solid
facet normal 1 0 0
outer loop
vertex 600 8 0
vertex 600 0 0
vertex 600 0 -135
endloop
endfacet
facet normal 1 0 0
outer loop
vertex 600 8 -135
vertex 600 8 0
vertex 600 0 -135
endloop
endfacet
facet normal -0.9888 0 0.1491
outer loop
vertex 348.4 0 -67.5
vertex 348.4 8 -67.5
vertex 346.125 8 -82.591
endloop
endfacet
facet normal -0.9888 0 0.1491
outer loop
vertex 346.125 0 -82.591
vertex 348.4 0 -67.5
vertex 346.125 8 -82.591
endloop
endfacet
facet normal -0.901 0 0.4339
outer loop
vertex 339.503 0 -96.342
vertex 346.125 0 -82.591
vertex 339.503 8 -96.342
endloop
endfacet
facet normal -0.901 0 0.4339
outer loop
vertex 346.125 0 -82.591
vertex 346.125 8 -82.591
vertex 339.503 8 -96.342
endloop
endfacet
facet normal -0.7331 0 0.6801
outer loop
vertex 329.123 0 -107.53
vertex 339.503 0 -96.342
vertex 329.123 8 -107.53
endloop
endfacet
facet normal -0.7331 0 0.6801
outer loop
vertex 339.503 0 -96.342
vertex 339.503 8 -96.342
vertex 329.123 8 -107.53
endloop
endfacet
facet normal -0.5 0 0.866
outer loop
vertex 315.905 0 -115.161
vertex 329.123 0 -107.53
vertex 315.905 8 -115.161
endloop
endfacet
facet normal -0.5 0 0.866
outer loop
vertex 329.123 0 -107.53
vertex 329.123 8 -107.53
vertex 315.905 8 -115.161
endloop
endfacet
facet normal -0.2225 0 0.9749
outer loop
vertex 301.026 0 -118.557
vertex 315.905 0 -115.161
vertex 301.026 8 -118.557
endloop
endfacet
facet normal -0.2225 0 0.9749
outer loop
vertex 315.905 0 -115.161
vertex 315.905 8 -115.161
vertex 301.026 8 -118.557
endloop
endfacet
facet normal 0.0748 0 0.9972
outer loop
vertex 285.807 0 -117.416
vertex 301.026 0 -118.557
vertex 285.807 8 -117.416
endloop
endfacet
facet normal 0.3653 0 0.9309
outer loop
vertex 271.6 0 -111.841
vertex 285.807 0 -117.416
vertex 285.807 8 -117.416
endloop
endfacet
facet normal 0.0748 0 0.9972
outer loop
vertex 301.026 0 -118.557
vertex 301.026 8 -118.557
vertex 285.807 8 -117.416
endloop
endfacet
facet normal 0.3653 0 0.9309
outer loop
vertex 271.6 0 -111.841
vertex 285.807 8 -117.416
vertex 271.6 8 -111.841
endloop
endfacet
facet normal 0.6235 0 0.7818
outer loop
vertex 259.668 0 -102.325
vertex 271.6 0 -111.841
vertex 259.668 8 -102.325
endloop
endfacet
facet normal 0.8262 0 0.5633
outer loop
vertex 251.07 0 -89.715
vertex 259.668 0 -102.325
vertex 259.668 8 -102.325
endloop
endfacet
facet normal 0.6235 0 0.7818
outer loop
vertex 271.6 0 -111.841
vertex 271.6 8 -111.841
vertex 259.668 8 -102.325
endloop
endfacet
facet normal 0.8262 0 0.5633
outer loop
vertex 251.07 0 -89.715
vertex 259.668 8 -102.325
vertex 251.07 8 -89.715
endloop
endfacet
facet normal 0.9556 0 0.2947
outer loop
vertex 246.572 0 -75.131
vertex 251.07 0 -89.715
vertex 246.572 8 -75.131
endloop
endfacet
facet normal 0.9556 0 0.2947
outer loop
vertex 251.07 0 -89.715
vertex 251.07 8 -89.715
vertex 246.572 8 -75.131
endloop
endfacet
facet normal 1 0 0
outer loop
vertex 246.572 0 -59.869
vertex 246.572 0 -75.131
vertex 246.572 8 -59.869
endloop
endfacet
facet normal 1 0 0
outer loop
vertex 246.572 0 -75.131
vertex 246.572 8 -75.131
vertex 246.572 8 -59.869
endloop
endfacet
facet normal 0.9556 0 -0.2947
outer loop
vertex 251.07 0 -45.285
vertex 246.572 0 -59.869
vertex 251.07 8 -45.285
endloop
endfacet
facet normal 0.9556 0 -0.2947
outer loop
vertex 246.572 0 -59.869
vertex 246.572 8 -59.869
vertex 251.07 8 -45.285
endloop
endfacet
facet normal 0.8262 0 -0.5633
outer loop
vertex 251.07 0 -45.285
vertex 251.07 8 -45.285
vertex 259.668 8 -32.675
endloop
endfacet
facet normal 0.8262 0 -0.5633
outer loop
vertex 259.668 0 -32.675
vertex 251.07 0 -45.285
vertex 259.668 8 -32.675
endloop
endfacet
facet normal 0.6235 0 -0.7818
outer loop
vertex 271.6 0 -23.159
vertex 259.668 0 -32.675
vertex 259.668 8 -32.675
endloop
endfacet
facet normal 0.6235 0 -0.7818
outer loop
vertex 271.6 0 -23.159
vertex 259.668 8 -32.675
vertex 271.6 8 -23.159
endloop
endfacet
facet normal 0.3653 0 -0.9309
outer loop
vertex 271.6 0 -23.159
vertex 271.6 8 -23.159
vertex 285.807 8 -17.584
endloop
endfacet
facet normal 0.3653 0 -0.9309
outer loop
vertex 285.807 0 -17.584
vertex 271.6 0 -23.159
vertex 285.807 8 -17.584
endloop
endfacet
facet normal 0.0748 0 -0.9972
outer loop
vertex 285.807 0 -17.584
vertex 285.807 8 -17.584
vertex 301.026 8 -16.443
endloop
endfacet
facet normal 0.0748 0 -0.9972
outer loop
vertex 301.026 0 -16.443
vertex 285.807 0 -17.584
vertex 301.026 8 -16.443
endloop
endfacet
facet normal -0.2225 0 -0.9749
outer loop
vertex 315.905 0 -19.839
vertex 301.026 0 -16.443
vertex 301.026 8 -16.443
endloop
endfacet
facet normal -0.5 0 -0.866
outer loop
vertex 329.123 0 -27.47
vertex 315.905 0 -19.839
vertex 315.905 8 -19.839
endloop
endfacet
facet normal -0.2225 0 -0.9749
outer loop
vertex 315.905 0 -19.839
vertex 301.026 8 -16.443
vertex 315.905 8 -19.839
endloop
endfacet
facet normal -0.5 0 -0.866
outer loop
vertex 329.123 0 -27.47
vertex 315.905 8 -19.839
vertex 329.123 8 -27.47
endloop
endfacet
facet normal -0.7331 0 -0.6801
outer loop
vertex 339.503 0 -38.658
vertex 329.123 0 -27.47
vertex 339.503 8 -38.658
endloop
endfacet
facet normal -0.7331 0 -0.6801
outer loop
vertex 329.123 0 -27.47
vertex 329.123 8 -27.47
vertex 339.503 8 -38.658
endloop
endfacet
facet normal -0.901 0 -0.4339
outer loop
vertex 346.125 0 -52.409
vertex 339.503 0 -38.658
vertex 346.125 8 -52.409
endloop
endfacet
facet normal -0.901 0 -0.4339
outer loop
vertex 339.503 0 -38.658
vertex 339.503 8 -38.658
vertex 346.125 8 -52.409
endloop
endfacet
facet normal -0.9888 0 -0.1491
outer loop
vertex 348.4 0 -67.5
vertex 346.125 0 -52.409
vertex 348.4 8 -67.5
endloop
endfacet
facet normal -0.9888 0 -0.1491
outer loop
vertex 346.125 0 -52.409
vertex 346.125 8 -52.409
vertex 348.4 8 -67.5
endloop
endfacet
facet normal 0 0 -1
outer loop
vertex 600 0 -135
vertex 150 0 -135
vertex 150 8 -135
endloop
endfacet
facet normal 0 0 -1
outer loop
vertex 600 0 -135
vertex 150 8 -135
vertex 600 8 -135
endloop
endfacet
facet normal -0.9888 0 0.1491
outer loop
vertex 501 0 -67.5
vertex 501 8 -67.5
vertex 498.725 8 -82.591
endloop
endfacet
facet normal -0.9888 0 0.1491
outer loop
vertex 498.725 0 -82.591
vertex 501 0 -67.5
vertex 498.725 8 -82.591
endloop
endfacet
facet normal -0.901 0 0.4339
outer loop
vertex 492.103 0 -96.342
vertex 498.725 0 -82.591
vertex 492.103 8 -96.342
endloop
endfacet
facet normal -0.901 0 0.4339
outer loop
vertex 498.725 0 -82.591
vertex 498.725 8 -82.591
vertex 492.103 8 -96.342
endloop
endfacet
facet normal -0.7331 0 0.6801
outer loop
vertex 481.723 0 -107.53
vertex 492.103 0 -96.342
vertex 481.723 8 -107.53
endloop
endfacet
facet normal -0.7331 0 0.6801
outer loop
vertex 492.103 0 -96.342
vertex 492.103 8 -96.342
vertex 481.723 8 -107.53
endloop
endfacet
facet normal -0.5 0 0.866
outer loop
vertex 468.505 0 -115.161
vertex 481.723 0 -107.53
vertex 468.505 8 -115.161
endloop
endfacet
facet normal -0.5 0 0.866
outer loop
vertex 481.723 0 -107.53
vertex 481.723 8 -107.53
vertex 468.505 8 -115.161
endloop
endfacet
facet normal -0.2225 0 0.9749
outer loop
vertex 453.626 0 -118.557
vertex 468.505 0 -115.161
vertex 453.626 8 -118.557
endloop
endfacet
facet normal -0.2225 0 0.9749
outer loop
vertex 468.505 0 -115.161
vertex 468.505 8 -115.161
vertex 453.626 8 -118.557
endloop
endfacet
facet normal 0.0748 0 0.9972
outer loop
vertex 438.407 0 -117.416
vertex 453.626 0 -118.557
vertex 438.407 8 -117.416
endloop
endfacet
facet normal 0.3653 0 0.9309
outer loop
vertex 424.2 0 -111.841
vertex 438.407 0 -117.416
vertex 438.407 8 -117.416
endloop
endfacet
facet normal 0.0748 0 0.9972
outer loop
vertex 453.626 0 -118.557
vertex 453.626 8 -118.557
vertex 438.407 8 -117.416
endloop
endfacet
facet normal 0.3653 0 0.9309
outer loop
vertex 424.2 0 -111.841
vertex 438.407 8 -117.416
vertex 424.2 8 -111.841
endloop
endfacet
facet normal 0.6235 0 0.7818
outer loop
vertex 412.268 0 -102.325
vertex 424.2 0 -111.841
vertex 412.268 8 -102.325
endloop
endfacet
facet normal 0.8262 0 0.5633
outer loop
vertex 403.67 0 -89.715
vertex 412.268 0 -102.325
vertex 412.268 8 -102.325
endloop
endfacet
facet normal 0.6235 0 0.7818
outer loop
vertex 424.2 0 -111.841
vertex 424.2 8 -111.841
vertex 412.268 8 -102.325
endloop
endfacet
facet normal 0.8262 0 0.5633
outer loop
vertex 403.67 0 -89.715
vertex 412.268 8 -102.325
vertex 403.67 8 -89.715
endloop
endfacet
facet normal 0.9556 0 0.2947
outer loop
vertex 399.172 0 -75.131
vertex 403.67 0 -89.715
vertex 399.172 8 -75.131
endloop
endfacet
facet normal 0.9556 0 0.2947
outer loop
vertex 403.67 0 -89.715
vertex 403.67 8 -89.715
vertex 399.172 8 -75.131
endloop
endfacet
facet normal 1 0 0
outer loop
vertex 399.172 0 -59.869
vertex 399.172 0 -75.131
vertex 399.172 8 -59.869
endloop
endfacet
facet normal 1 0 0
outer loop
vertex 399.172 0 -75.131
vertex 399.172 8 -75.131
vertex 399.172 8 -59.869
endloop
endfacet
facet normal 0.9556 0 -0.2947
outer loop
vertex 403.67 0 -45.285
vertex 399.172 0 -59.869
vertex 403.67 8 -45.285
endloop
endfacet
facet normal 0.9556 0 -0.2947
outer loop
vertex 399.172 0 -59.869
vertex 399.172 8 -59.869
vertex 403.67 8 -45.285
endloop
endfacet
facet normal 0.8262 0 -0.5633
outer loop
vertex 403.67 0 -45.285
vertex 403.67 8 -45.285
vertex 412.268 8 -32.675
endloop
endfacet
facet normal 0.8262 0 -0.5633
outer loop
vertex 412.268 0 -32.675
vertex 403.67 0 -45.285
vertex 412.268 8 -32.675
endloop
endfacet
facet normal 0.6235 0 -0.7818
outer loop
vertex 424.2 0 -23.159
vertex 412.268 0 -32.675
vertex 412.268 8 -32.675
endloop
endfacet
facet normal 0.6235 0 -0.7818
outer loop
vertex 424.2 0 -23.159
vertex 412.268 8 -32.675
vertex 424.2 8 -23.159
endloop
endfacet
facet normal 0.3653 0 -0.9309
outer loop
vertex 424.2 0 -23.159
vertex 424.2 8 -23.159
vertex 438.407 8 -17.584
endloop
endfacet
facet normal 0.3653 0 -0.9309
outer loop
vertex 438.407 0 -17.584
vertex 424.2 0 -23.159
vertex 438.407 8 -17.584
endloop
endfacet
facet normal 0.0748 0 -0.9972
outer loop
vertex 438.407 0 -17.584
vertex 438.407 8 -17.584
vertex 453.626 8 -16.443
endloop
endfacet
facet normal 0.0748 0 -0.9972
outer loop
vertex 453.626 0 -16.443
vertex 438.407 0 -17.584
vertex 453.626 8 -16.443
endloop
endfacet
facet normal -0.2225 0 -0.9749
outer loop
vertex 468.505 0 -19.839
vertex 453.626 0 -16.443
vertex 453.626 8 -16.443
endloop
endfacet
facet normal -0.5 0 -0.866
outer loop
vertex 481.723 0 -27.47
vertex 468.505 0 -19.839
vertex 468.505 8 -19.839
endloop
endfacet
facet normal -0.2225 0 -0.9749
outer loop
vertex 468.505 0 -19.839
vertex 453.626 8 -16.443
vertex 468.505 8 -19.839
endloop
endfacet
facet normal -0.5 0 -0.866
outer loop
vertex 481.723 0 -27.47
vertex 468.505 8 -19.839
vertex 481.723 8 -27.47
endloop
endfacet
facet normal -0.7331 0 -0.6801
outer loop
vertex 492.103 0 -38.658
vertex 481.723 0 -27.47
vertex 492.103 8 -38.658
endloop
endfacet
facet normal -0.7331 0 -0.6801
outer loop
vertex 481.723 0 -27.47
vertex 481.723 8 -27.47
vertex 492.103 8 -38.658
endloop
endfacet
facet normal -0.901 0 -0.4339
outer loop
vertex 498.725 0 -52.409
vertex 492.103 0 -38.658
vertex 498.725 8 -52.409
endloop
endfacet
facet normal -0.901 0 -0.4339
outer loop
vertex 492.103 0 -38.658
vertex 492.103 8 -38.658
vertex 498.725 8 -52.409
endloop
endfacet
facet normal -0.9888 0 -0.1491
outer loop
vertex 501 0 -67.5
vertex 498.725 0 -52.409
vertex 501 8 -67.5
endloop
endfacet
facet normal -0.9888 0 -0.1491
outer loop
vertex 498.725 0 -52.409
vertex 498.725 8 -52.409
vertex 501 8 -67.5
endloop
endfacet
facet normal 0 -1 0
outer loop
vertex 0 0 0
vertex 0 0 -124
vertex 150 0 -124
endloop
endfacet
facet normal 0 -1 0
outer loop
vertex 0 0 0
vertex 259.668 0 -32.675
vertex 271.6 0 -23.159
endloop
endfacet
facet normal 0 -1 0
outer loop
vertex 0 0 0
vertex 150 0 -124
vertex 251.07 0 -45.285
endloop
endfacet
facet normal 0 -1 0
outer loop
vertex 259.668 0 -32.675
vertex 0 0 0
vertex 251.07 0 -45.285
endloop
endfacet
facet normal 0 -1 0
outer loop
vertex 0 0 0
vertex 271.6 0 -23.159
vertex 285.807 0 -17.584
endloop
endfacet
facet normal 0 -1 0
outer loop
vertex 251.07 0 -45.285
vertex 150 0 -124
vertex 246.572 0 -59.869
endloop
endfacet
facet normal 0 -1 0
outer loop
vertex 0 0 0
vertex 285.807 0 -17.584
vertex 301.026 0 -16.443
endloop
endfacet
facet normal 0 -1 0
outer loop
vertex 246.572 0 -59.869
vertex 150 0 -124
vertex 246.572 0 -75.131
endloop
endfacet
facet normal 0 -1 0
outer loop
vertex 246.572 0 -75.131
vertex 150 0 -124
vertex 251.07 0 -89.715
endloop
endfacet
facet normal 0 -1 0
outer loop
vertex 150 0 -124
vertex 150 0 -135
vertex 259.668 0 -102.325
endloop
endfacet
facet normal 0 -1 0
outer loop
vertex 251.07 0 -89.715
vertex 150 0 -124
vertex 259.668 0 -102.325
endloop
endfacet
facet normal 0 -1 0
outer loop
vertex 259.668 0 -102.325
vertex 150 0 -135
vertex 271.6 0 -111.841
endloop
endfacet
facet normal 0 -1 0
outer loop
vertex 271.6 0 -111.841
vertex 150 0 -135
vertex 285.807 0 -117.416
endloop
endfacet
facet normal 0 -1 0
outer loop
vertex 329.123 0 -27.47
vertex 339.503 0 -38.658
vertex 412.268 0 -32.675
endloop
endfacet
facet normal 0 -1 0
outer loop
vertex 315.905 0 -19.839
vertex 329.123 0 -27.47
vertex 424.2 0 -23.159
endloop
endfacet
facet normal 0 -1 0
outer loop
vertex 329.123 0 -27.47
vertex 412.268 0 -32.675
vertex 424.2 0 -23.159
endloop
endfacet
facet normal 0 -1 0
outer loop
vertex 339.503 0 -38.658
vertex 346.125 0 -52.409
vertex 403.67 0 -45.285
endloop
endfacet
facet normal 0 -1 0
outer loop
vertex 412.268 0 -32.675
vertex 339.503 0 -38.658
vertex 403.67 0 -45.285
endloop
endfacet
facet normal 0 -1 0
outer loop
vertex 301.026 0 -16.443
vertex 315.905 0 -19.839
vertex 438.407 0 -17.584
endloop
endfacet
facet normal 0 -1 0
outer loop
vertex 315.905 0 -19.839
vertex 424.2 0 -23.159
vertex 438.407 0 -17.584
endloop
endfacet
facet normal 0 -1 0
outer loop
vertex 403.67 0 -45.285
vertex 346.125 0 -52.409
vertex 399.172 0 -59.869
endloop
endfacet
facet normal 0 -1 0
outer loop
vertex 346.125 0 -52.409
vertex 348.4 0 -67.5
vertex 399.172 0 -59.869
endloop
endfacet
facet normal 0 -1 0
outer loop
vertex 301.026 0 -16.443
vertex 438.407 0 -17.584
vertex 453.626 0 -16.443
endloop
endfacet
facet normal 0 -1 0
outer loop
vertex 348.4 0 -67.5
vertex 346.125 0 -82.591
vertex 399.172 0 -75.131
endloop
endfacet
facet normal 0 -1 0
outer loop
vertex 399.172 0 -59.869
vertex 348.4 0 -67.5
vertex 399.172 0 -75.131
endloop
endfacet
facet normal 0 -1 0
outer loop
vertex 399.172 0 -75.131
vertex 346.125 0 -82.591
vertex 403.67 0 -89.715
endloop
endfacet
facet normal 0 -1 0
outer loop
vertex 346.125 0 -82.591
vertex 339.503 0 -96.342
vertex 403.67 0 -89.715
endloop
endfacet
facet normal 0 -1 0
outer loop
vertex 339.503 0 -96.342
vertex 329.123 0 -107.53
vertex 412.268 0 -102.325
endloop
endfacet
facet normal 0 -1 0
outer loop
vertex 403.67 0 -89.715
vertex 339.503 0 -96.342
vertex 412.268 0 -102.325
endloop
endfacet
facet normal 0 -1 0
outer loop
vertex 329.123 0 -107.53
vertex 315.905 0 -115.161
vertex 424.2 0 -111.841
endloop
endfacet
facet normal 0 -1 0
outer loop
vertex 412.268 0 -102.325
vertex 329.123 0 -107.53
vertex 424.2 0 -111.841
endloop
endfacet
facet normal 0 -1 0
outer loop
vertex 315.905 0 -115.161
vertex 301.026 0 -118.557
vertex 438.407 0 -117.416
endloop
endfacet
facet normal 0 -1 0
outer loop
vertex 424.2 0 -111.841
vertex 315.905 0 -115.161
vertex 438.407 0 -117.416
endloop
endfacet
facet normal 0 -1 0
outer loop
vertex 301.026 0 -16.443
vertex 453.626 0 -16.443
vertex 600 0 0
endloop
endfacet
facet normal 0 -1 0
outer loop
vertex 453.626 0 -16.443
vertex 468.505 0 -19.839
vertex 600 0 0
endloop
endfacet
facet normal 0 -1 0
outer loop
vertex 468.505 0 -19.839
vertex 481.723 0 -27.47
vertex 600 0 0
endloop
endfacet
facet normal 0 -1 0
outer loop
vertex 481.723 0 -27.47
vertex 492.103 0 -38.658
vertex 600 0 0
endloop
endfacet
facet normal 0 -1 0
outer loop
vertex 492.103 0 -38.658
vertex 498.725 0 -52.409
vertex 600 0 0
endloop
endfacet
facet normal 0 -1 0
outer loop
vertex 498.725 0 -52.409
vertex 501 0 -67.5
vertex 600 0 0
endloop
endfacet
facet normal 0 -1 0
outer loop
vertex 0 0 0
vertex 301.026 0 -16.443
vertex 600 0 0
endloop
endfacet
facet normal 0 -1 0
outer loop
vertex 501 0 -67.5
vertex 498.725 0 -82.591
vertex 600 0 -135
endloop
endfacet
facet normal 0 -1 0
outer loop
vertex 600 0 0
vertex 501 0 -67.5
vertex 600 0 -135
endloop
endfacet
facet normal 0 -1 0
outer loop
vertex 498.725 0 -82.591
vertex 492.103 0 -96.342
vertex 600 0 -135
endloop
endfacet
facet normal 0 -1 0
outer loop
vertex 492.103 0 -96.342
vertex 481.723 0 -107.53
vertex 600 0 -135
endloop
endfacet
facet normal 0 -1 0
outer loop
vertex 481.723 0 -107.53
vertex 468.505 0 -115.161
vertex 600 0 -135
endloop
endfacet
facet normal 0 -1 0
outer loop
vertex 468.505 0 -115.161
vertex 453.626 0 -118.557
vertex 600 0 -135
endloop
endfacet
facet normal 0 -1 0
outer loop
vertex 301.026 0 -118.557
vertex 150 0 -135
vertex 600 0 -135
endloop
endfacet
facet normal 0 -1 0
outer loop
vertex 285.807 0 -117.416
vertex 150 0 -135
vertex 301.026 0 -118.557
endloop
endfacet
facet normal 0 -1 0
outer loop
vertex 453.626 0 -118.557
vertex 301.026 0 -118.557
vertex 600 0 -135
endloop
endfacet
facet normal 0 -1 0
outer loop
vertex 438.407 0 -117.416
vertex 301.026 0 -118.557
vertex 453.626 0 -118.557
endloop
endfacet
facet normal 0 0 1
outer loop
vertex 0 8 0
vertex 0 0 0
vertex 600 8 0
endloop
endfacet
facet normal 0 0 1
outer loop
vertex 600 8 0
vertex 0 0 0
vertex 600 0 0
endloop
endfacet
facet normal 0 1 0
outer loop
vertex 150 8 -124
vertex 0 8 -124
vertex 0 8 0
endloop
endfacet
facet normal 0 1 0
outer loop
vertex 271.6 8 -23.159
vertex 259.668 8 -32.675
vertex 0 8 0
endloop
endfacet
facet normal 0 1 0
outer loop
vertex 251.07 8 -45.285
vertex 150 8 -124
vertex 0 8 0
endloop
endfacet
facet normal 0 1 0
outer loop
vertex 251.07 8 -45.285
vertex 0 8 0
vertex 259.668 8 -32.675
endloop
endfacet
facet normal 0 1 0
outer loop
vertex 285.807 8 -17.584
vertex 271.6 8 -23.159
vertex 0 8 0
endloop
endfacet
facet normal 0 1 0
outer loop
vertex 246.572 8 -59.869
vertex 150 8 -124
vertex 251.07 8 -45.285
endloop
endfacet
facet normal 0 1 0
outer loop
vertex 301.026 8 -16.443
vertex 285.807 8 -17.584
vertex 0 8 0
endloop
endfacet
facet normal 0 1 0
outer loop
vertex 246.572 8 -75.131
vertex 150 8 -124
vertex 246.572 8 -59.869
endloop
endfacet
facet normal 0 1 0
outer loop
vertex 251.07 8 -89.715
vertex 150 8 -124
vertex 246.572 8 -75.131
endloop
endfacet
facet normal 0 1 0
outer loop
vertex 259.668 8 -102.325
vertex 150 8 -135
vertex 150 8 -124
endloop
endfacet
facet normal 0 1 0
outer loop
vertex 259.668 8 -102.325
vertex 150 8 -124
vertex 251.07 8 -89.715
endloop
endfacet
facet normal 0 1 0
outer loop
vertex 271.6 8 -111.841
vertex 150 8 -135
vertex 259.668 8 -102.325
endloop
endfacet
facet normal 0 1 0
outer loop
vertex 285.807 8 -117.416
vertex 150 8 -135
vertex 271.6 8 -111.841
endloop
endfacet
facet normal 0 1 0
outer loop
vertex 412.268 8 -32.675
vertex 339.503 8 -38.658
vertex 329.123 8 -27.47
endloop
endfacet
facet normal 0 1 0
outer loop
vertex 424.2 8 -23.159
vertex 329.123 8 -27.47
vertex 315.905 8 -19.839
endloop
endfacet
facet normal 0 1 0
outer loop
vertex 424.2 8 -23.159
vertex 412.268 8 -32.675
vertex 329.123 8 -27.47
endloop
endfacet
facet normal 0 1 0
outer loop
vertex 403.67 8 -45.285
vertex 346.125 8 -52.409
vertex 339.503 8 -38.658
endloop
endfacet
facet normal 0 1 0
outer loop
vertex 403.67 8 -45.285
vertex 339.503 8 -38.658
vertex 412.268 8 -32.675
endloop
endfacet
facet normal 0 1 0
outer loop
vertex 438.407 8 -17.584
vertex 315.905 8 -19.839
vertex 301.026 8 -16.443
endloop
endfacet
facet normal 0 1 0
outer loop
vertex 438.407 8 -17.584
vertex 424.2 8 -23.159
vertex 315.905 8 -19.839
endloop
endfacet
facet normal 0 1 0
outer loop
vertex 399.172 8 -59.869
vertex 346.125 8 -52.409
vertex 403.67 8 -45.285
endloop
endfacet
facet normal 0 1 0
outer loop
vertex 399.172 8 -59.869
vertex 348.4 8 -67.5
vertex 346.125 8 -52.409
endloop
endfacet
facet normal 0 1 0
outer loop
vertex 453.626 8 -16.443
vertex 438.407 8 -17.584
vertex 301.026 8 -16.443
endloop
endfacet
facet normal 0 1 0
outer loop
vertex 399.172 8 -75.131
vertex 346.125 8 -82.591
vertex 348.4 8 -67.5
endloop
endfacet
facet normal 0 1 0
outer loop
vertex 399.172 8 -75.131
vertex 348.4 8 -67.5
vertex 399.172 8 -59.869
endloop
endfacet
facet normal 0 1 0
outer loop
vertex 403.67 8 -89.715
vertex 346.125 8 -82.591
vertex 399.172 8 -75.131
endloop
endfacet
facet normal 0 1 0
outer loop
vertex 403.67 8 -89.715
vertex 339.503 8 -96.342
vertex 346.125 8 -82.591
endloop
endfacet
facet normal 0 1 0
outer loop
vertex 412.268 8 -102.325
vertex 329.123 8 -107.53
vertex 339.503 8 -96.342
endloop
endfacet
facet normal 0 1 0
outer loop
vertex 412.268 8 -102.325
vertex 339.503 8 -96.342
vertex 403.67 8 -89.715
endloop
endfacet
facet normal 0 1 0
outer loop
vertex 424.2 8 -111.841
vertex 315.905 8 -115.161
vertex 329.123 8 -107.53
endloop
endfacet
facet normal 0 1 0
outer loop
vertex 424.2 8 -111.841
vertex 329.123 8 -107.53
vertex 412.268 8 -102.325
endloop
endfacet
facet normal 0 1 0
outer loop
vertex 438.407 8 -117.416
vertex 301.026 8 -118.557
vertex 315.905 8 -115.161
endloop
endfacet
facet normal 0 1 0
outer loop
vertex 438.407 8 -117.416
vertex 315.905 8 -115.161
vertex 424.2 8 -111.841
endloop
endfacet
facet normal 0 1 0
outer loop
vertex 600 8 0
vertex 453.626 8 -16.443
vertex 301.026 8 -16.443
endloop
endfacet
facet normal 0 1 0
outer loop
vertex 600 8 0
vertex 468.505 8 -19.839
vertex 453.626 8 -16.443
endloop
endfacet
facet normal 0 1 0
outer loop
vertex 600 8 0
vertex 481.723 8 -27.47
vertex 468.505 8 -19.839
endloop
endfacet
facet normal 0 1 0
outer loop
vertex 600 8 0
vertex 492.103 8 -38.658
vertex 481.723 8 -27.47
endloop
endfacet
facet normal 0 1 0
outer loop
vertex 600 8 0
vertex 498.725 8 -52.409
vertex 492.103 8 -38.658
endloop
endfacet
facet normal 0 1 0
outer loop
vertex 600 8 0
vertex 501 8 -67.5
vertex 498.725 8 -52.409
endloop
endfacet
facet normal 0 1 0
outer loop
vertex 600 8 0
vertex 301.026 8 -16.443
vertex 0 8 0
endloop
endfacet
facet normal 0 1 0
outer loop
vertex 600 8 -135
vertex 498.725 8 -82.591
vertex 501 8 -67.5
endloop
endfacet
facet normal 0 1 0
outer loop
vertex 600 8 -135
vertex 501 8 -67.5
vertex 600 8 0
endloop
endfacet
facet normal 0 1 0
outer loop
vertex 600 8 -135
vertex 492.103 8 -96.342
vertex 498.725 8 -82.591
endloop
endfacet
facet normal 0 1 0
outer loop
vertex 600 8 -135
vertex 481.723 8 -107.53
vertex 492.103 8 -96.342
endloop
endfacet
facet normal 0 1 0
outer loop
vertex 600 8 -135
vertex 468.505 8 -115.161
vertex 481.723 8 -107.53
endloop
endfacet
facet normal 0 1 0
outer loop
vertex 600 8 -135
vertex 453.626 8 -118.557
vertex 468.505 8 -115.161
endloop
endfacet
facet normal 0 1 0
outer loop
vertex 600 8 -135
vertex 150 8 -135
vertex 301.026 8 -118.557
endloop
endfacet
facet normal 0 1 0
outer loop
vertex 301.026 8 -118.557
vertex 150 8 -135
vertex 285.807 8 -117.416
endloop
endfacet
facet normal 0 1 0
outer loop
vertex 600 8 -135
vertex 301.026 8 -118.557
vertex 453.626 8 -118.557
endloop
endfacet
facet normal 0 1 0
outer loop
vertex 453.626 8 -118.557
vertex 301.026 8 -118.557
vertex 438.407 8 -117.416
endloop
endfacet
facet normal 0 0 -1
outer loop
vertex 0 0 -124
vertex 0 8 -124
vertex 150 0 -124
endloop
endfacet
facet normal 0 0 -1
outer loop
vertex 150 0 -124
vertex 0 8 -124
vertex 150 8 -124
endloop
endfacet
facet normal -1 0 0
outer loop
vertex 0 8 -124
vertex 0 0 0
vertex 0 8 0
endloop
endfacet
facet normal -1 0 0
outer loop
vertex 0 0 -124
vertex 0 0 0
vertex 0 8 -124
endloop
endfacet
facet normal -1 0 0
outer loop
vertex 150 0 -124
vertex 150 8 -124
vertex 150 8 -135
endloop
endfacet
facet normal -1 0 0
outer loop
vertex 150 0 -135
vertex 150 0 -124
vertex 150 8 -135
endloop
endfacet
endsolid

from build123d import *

# Parameters (mm, degrees)
SKETCH2_W           = 600
SKETCH2_H           = 135
BOSS_EXTRUDE1_DEPTH = 8
SKETCH3_R           = 51.2
SKETCH3_W           = 150
SKETCH3_H           = 11
CUT_EXTRUDE1_DEPTH  = 8


with BuildPart() as part:
    # Sketch2 → Boss-Extrude1 (new body)
    with BuildSketch(Plane(origin=(0, 0, 0), x_dir=(1, 0, 0), z_dir=(0, 1, 0))):
        with Locations((300, 67.5)):
            Rectangle(SKETCH2_W, SKETCH2_H)
    extrude(amount=BOSS_EXTRUDE1_DEPTH)

    # Sketch3 → Cut-Extrude1 (cut)
    with BuildSketch(Plane(origin=(0, 8, 0), x_dir=(1, 0, 0), z_dir=(0, 1, 0))):
        with Locations((449.8, 67.5)):
            Circle(SKETCH3_R)
        with Locations((297.2, 67.5)):
            Circle(SKETCH3_R)
        with Locations((75, 129.5)):
            Rectangle(SKETCH3_W, SKETCH3_H)
    extrude(amount=-CUT_EXTRUDE1_DEPTH, mode=Mode.SUBTRACT)


solid = part.part
